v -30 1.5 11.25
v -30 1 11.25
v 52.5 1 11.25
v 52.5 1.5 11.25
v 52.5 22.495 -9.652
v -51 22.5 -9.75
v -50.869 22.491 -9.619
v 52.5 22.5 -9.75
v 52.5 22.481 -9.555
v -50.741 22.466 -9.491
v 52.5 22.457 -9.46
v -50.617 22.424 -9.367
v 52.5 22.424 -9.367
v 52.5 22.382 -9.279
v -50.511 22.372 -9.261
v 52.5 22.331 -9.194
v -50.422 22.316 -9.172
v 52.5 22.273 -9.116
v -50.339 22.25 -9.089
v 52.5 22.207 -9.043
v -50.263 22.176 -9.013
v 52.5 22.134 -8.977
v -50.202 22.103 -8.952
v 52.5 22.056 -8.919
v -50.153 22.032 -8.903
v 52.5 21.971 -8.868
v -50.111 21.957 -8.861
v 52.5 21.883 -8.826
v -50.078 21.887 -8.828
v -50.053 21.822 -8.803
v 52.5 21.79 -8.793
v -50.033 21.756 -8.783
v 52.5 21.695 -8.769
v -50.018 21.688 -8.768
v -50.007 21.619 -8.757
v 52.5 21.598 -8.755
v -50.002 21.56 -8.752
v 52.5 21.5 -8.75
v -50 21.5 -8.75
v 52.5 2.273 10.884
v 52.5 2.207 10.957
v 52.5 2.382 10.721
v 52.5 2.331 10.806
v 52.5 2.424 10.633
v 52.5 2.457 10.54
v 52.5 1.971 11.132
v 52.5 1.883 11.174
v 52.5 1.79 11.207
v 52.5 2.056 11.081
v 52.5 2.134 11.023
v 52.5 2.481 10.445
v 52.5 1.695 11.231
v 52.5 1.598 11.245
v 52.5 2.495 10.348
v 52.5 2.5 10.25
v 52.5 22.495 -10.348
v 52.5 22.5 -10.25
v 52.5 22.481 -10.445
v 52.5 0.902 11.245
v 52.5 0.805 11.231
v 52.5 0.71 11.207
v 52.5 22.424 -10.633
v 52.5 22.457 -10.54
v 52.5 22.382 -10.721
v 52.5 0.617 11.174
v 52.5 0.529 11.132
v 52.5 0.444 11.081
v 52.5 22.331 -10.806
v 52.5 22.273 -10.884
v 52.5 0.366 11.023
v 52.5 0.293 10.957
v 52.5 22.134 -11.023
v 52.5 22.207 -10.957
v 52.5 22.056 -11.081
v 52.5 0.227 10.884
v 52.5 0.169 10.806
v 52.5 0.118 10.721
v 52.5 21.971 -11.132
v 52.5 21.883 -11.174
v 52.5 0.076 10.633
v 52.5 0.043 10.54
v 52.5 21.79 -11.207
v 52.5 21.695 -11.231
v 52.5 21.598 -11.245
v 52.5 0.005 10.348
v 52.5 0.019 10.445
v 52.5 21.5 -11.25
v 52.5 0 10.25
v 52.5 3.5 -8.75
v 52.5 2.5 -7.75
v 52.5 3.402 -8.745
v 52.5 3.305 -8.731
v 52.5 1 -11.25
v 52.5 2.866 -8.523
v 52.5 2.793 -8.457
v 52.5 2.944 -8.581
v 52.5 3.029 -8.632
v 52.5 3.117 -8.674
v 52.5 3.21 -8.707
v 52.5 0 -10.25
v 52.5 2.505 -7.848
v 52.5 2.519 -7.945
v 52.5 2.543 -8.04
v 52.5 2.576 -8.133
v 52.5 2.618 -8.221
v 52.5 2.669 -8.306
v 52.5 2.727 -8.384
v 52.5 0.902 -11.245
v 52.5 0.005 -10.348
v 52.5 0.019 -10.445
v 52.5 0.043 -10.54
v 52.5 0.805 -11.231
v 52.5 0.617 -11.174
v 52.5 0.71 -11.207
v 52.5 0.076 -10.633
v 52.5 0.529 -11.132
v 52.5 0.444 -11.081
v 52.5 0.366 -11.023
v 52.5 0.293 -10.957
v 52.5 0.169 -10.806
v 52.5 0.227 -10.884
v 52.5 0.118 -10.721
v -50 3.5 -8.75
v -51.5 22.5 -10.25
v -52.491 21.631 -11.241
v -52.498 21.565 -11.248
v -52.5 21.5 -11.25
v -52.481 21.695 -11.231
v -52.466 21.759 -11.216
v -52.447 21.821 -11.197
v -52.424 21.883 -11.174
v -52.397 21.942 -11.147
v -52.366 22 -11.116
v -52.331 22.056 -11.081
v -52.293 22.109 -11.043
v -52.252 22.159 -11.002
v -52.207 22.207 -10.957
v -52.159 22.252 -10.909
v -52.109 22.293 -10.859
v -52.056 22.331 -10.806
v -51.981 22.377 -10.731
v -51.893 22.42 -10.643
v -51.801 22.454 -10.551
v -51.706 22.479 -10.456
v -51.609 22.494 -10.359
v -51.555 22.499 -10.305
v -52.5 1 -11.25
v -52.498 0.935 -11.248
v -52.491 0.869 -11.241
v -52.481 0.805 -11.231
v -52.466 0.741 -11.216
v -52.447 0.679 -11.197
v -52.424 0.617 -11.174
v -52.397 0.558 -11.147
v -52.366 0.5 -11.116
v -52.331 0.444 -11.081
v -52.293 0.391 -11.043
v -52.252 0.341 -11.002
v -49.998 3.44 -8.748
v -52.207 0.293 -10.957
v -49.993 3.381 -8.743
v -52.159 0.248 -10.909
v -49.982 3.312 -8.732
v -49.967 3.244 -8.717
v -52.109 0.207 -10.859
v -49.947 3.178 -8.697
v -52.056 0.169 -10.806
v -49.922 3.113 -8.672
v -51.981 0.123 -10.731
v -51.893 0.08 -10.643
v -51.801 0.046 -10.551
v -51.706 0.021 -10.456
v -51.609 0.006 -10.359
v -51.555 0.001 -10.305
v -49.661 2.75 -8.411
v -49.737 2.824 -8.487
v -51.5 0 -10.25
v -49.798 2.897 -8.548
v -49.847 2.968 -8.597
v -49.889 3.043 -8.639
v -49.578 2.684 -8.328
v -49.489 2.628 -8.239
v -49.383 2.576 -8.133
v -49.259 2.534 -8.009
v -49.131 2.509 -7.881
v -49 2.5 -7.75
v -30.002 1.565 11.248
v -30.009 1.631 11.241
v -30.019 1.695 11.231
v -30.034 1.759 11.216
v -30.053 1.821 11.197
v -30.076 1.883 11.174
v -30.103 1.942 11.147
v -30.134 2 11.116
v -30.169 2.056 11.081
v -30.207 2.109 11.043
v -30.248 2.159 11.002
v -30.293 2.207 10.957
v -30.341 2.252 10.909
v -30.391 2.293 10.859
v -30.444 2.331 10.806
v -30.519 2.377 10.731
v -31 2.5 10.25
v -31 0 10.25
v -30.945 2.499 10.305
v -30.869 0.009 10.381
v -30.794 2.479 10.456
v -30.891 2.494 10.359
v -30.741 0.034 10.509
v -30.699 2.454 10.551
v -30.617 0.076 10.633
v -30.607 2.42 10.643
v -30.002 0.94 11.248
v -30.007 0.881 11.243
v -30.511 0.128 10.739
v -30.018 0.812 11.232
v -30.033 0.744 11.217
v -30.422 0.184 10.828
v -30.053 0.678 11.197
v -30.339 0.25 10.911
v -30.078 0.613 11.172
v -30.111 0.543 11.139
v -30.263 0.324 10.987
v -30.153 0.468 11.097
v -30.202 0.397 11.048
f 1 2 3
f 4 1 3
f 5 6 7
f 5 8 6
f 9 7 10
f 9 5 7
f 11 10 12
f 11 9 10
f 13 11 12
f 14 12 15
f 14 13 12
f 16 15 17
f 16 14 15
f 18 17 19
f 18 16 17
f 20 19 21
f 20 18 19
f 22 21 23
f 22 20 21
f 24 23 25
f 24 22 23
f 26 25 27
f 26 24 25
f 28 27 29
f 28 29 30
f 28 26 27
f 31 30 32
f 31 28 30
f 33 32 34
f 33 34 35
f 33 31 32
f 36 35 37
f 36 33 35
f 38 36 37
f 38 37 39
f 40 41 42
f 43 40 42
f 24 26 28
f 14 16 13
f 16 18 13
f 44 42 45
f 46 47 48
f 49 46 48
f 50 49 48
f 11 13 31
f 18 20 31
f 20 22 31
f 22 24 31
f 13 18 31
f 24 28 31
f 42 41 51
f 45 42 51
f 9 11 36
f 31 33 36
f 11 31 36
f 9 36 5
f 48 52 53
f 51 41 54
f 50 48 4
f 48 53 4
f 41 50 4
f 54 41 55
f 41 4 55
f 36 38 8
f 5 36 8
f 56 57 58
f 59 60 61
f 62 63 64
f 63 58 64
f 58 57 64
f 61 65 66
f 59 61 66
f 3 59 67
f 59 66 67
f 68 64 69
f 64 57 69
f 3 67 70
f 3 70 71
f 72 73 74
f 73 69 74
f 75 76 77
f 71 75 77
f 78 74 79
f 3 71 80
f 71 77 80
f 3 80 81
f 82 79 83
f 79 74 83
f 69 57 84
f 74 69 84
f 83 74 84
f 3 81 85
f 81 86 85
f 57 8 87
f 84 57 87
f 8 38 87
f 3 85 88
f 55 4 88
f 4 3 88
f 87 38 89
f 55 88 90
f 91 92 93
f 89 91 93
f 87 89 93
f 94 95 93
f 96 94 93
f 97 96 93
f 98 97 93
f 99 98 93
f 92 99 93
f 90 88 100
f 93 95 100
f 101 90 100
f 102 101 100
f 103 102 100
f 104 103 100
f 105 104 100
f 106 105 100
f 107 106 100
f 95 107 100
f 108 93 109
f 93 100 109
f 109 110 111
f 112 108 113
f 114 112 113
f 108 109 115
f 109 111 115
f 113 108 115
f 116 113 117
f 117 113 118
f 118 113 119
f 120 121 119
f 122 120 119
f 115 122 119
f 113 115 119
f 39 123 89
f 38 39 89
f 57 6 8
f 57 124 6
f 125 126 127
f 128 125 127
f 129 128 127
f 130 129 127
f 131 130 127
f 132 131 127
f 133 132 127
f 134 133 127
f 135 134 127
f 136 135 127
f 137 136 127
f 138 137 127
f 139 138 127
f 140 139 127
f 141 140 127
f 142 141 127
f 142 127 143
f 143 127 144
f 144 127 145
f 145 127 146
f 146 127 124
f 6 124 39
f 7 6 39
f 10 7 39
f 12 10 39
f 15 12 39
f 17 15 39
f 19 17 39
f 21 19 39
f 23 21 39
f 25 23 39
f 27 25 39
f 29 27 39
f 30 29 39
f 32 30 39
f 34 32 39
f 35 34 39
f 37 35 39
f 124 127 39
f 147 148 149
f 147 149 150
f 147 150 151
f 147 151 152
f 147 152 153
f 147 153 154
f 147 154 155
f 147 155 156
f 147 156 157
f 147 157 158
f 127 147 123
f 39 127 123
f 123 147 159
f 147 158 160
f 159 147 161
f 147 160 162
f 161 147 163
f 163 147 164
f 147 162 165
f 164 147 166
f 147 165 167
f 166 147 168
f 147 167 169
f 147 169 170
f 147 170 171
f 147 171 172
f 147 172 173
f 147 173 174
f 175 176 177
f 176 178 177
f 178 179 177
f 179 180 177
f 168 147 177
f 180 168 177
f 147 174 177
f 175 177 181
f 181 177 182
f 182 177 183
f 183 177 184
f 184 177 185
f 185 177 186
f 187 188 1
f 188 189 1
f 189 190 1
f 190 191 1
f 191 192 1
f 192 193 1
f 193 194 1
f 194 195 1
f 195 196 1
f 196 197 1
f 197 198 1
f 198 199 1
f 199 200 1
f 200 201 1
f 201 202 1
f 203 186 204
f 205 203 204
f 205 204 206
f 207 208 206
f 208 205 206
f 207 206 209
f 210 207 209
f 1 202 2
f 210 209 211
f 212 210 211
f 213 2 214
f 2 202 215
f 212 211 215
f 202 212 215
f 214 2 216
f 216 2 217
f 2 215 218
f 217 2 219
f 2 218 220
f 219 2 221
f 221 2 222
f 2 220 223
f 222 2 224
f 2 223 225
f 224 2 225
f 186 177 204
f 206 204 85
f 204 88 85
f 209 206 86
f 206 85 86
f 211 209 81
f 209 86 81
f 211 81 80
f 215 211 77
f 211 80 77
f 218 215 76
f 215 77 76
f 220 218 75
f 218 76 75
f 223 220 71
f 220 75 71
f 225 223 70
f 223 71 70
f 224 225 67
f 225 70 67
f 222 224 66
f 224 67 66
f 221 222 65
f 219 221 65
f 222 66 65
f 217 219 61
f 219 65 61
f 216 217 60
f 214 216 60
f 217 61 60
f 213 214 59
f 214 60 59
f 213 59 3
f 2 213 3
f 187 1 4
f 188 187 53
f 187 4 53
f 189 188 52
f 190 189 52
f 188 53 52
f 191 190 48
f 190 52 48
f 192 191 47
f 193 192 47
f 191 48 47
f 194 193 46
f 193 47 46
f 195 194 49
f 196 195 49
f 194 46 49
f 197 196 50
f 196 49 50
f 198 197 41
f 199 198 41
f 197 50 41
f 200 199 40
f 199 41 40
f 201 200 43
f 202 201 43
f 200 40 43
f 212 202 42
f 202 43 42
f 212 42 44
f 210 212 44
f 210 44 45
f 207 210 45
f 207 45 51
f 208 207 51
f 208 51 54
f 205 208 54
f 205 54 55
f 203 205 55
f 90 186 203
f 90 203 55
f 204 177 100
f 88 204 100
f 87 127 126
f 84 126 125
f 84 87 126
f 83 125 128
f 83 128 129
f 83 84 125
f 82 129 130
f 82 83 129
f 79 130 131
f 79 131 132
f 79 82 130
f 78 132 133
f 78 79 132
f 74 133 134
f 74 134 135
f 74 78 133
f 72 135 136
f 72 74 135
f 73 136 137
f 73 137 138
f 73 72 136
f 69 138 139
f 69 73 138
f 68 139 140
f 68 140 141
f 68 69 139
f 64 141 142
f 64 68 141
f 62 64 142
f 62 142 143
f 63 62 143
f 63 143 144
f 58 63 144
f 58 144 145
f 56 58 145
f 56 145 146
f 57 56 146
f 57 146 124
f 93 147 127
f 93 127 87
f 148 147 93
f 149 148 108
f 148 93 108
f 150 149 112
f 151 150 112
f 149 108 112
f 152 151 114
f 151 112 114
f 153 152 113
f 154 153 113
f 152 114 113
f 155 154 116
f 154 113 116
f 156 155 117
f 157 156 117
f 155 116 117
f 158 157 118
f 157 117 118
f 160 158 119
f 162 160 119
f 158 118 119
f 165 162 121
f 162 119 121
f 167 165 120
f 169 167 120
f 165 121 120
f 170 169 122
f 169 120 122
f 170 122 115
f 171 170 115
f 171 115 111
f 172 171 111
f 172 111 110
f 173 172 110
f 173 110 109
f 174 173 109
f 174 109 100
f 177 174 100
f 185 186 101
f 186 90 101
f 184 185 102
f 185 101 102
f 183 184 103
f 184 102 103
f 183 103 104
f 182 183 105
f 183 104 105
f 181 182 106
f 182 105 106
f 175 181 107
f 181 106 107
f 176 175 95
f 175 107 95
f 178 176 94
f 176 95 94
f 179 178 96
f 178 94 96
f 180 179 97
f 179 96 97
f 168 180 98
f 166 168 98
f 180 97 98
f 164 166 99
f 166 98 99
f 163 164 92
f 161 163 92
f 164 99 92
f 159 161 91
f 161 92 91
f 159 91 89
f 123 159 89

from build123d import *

# Parameters (mm, degrees)
SKETCH1_W           = 105
SKETCH1_H           = 22.5
BOSS_EXTRUDE1_DEPTH = 2.5
SKETCH2_W           = 105
SKETCH2_H           = 2.5
BOSS_EXTRUDE2_DEPTH = 20
CUT_EXTRUDE1_DEPTH  = 59.215655111
FILLET1_R           = 1


with BuildPart() as part:
    # Sketch1 → Boss-Extrude1 (new body)
    with BuildSketch(Plane(origin=(0, 0, 0), x_dir=(1, 0, 0), z_dir=(0, 1, 0))):
        Rectangle(SKETCH1_W, SKETCH1_H)
    extrude(amount=BOSS_EXTRUDE1_DEPTH)

    # Sketch2 → Boss-Extrude2 (add)
    with BuildSketch(Plane(origin=(0, 2.5, 0), x_dir=(1, 0, 0), z_dir=(0, 1, 0))):
        with Locations((0, 10)):
            Rectangle(SKETCH2_W, SKETCH2_H)
    extrude(amount=BOSS_EXTRUDE2_DEPTH)

    # Sketch3 → Cut-Extrude1 (cut, through all)
    with BuildSketch(Plane(origin=(0, 0, 0), x_dir=(-1, 0, 0), z_dir=(0, -1, 0))):
        Polygon((52.5, -11.25), (52.5, 11.25), (30, -11.25), align=None)
    extrude(amount=-CUT_EXTRUDE1_DEPTH, mode=Mode.SUBTRACT)

    # Fillet1
    fillet1_edges = [part.edges().sort_by_distance(p)[0] for p in [
        (0, 22.5, -11.25),
        (1.25, 22.5, -8.75),
        (1.25, 2.5, -8.75),
        (11.25, 0, 11.25),
        (11.25, 2.5, 11.25),
        (0, 0, -11.25),
    ]]
    fillet(fillet1_edges, radius=FILLET1_R)


solid = part.part
